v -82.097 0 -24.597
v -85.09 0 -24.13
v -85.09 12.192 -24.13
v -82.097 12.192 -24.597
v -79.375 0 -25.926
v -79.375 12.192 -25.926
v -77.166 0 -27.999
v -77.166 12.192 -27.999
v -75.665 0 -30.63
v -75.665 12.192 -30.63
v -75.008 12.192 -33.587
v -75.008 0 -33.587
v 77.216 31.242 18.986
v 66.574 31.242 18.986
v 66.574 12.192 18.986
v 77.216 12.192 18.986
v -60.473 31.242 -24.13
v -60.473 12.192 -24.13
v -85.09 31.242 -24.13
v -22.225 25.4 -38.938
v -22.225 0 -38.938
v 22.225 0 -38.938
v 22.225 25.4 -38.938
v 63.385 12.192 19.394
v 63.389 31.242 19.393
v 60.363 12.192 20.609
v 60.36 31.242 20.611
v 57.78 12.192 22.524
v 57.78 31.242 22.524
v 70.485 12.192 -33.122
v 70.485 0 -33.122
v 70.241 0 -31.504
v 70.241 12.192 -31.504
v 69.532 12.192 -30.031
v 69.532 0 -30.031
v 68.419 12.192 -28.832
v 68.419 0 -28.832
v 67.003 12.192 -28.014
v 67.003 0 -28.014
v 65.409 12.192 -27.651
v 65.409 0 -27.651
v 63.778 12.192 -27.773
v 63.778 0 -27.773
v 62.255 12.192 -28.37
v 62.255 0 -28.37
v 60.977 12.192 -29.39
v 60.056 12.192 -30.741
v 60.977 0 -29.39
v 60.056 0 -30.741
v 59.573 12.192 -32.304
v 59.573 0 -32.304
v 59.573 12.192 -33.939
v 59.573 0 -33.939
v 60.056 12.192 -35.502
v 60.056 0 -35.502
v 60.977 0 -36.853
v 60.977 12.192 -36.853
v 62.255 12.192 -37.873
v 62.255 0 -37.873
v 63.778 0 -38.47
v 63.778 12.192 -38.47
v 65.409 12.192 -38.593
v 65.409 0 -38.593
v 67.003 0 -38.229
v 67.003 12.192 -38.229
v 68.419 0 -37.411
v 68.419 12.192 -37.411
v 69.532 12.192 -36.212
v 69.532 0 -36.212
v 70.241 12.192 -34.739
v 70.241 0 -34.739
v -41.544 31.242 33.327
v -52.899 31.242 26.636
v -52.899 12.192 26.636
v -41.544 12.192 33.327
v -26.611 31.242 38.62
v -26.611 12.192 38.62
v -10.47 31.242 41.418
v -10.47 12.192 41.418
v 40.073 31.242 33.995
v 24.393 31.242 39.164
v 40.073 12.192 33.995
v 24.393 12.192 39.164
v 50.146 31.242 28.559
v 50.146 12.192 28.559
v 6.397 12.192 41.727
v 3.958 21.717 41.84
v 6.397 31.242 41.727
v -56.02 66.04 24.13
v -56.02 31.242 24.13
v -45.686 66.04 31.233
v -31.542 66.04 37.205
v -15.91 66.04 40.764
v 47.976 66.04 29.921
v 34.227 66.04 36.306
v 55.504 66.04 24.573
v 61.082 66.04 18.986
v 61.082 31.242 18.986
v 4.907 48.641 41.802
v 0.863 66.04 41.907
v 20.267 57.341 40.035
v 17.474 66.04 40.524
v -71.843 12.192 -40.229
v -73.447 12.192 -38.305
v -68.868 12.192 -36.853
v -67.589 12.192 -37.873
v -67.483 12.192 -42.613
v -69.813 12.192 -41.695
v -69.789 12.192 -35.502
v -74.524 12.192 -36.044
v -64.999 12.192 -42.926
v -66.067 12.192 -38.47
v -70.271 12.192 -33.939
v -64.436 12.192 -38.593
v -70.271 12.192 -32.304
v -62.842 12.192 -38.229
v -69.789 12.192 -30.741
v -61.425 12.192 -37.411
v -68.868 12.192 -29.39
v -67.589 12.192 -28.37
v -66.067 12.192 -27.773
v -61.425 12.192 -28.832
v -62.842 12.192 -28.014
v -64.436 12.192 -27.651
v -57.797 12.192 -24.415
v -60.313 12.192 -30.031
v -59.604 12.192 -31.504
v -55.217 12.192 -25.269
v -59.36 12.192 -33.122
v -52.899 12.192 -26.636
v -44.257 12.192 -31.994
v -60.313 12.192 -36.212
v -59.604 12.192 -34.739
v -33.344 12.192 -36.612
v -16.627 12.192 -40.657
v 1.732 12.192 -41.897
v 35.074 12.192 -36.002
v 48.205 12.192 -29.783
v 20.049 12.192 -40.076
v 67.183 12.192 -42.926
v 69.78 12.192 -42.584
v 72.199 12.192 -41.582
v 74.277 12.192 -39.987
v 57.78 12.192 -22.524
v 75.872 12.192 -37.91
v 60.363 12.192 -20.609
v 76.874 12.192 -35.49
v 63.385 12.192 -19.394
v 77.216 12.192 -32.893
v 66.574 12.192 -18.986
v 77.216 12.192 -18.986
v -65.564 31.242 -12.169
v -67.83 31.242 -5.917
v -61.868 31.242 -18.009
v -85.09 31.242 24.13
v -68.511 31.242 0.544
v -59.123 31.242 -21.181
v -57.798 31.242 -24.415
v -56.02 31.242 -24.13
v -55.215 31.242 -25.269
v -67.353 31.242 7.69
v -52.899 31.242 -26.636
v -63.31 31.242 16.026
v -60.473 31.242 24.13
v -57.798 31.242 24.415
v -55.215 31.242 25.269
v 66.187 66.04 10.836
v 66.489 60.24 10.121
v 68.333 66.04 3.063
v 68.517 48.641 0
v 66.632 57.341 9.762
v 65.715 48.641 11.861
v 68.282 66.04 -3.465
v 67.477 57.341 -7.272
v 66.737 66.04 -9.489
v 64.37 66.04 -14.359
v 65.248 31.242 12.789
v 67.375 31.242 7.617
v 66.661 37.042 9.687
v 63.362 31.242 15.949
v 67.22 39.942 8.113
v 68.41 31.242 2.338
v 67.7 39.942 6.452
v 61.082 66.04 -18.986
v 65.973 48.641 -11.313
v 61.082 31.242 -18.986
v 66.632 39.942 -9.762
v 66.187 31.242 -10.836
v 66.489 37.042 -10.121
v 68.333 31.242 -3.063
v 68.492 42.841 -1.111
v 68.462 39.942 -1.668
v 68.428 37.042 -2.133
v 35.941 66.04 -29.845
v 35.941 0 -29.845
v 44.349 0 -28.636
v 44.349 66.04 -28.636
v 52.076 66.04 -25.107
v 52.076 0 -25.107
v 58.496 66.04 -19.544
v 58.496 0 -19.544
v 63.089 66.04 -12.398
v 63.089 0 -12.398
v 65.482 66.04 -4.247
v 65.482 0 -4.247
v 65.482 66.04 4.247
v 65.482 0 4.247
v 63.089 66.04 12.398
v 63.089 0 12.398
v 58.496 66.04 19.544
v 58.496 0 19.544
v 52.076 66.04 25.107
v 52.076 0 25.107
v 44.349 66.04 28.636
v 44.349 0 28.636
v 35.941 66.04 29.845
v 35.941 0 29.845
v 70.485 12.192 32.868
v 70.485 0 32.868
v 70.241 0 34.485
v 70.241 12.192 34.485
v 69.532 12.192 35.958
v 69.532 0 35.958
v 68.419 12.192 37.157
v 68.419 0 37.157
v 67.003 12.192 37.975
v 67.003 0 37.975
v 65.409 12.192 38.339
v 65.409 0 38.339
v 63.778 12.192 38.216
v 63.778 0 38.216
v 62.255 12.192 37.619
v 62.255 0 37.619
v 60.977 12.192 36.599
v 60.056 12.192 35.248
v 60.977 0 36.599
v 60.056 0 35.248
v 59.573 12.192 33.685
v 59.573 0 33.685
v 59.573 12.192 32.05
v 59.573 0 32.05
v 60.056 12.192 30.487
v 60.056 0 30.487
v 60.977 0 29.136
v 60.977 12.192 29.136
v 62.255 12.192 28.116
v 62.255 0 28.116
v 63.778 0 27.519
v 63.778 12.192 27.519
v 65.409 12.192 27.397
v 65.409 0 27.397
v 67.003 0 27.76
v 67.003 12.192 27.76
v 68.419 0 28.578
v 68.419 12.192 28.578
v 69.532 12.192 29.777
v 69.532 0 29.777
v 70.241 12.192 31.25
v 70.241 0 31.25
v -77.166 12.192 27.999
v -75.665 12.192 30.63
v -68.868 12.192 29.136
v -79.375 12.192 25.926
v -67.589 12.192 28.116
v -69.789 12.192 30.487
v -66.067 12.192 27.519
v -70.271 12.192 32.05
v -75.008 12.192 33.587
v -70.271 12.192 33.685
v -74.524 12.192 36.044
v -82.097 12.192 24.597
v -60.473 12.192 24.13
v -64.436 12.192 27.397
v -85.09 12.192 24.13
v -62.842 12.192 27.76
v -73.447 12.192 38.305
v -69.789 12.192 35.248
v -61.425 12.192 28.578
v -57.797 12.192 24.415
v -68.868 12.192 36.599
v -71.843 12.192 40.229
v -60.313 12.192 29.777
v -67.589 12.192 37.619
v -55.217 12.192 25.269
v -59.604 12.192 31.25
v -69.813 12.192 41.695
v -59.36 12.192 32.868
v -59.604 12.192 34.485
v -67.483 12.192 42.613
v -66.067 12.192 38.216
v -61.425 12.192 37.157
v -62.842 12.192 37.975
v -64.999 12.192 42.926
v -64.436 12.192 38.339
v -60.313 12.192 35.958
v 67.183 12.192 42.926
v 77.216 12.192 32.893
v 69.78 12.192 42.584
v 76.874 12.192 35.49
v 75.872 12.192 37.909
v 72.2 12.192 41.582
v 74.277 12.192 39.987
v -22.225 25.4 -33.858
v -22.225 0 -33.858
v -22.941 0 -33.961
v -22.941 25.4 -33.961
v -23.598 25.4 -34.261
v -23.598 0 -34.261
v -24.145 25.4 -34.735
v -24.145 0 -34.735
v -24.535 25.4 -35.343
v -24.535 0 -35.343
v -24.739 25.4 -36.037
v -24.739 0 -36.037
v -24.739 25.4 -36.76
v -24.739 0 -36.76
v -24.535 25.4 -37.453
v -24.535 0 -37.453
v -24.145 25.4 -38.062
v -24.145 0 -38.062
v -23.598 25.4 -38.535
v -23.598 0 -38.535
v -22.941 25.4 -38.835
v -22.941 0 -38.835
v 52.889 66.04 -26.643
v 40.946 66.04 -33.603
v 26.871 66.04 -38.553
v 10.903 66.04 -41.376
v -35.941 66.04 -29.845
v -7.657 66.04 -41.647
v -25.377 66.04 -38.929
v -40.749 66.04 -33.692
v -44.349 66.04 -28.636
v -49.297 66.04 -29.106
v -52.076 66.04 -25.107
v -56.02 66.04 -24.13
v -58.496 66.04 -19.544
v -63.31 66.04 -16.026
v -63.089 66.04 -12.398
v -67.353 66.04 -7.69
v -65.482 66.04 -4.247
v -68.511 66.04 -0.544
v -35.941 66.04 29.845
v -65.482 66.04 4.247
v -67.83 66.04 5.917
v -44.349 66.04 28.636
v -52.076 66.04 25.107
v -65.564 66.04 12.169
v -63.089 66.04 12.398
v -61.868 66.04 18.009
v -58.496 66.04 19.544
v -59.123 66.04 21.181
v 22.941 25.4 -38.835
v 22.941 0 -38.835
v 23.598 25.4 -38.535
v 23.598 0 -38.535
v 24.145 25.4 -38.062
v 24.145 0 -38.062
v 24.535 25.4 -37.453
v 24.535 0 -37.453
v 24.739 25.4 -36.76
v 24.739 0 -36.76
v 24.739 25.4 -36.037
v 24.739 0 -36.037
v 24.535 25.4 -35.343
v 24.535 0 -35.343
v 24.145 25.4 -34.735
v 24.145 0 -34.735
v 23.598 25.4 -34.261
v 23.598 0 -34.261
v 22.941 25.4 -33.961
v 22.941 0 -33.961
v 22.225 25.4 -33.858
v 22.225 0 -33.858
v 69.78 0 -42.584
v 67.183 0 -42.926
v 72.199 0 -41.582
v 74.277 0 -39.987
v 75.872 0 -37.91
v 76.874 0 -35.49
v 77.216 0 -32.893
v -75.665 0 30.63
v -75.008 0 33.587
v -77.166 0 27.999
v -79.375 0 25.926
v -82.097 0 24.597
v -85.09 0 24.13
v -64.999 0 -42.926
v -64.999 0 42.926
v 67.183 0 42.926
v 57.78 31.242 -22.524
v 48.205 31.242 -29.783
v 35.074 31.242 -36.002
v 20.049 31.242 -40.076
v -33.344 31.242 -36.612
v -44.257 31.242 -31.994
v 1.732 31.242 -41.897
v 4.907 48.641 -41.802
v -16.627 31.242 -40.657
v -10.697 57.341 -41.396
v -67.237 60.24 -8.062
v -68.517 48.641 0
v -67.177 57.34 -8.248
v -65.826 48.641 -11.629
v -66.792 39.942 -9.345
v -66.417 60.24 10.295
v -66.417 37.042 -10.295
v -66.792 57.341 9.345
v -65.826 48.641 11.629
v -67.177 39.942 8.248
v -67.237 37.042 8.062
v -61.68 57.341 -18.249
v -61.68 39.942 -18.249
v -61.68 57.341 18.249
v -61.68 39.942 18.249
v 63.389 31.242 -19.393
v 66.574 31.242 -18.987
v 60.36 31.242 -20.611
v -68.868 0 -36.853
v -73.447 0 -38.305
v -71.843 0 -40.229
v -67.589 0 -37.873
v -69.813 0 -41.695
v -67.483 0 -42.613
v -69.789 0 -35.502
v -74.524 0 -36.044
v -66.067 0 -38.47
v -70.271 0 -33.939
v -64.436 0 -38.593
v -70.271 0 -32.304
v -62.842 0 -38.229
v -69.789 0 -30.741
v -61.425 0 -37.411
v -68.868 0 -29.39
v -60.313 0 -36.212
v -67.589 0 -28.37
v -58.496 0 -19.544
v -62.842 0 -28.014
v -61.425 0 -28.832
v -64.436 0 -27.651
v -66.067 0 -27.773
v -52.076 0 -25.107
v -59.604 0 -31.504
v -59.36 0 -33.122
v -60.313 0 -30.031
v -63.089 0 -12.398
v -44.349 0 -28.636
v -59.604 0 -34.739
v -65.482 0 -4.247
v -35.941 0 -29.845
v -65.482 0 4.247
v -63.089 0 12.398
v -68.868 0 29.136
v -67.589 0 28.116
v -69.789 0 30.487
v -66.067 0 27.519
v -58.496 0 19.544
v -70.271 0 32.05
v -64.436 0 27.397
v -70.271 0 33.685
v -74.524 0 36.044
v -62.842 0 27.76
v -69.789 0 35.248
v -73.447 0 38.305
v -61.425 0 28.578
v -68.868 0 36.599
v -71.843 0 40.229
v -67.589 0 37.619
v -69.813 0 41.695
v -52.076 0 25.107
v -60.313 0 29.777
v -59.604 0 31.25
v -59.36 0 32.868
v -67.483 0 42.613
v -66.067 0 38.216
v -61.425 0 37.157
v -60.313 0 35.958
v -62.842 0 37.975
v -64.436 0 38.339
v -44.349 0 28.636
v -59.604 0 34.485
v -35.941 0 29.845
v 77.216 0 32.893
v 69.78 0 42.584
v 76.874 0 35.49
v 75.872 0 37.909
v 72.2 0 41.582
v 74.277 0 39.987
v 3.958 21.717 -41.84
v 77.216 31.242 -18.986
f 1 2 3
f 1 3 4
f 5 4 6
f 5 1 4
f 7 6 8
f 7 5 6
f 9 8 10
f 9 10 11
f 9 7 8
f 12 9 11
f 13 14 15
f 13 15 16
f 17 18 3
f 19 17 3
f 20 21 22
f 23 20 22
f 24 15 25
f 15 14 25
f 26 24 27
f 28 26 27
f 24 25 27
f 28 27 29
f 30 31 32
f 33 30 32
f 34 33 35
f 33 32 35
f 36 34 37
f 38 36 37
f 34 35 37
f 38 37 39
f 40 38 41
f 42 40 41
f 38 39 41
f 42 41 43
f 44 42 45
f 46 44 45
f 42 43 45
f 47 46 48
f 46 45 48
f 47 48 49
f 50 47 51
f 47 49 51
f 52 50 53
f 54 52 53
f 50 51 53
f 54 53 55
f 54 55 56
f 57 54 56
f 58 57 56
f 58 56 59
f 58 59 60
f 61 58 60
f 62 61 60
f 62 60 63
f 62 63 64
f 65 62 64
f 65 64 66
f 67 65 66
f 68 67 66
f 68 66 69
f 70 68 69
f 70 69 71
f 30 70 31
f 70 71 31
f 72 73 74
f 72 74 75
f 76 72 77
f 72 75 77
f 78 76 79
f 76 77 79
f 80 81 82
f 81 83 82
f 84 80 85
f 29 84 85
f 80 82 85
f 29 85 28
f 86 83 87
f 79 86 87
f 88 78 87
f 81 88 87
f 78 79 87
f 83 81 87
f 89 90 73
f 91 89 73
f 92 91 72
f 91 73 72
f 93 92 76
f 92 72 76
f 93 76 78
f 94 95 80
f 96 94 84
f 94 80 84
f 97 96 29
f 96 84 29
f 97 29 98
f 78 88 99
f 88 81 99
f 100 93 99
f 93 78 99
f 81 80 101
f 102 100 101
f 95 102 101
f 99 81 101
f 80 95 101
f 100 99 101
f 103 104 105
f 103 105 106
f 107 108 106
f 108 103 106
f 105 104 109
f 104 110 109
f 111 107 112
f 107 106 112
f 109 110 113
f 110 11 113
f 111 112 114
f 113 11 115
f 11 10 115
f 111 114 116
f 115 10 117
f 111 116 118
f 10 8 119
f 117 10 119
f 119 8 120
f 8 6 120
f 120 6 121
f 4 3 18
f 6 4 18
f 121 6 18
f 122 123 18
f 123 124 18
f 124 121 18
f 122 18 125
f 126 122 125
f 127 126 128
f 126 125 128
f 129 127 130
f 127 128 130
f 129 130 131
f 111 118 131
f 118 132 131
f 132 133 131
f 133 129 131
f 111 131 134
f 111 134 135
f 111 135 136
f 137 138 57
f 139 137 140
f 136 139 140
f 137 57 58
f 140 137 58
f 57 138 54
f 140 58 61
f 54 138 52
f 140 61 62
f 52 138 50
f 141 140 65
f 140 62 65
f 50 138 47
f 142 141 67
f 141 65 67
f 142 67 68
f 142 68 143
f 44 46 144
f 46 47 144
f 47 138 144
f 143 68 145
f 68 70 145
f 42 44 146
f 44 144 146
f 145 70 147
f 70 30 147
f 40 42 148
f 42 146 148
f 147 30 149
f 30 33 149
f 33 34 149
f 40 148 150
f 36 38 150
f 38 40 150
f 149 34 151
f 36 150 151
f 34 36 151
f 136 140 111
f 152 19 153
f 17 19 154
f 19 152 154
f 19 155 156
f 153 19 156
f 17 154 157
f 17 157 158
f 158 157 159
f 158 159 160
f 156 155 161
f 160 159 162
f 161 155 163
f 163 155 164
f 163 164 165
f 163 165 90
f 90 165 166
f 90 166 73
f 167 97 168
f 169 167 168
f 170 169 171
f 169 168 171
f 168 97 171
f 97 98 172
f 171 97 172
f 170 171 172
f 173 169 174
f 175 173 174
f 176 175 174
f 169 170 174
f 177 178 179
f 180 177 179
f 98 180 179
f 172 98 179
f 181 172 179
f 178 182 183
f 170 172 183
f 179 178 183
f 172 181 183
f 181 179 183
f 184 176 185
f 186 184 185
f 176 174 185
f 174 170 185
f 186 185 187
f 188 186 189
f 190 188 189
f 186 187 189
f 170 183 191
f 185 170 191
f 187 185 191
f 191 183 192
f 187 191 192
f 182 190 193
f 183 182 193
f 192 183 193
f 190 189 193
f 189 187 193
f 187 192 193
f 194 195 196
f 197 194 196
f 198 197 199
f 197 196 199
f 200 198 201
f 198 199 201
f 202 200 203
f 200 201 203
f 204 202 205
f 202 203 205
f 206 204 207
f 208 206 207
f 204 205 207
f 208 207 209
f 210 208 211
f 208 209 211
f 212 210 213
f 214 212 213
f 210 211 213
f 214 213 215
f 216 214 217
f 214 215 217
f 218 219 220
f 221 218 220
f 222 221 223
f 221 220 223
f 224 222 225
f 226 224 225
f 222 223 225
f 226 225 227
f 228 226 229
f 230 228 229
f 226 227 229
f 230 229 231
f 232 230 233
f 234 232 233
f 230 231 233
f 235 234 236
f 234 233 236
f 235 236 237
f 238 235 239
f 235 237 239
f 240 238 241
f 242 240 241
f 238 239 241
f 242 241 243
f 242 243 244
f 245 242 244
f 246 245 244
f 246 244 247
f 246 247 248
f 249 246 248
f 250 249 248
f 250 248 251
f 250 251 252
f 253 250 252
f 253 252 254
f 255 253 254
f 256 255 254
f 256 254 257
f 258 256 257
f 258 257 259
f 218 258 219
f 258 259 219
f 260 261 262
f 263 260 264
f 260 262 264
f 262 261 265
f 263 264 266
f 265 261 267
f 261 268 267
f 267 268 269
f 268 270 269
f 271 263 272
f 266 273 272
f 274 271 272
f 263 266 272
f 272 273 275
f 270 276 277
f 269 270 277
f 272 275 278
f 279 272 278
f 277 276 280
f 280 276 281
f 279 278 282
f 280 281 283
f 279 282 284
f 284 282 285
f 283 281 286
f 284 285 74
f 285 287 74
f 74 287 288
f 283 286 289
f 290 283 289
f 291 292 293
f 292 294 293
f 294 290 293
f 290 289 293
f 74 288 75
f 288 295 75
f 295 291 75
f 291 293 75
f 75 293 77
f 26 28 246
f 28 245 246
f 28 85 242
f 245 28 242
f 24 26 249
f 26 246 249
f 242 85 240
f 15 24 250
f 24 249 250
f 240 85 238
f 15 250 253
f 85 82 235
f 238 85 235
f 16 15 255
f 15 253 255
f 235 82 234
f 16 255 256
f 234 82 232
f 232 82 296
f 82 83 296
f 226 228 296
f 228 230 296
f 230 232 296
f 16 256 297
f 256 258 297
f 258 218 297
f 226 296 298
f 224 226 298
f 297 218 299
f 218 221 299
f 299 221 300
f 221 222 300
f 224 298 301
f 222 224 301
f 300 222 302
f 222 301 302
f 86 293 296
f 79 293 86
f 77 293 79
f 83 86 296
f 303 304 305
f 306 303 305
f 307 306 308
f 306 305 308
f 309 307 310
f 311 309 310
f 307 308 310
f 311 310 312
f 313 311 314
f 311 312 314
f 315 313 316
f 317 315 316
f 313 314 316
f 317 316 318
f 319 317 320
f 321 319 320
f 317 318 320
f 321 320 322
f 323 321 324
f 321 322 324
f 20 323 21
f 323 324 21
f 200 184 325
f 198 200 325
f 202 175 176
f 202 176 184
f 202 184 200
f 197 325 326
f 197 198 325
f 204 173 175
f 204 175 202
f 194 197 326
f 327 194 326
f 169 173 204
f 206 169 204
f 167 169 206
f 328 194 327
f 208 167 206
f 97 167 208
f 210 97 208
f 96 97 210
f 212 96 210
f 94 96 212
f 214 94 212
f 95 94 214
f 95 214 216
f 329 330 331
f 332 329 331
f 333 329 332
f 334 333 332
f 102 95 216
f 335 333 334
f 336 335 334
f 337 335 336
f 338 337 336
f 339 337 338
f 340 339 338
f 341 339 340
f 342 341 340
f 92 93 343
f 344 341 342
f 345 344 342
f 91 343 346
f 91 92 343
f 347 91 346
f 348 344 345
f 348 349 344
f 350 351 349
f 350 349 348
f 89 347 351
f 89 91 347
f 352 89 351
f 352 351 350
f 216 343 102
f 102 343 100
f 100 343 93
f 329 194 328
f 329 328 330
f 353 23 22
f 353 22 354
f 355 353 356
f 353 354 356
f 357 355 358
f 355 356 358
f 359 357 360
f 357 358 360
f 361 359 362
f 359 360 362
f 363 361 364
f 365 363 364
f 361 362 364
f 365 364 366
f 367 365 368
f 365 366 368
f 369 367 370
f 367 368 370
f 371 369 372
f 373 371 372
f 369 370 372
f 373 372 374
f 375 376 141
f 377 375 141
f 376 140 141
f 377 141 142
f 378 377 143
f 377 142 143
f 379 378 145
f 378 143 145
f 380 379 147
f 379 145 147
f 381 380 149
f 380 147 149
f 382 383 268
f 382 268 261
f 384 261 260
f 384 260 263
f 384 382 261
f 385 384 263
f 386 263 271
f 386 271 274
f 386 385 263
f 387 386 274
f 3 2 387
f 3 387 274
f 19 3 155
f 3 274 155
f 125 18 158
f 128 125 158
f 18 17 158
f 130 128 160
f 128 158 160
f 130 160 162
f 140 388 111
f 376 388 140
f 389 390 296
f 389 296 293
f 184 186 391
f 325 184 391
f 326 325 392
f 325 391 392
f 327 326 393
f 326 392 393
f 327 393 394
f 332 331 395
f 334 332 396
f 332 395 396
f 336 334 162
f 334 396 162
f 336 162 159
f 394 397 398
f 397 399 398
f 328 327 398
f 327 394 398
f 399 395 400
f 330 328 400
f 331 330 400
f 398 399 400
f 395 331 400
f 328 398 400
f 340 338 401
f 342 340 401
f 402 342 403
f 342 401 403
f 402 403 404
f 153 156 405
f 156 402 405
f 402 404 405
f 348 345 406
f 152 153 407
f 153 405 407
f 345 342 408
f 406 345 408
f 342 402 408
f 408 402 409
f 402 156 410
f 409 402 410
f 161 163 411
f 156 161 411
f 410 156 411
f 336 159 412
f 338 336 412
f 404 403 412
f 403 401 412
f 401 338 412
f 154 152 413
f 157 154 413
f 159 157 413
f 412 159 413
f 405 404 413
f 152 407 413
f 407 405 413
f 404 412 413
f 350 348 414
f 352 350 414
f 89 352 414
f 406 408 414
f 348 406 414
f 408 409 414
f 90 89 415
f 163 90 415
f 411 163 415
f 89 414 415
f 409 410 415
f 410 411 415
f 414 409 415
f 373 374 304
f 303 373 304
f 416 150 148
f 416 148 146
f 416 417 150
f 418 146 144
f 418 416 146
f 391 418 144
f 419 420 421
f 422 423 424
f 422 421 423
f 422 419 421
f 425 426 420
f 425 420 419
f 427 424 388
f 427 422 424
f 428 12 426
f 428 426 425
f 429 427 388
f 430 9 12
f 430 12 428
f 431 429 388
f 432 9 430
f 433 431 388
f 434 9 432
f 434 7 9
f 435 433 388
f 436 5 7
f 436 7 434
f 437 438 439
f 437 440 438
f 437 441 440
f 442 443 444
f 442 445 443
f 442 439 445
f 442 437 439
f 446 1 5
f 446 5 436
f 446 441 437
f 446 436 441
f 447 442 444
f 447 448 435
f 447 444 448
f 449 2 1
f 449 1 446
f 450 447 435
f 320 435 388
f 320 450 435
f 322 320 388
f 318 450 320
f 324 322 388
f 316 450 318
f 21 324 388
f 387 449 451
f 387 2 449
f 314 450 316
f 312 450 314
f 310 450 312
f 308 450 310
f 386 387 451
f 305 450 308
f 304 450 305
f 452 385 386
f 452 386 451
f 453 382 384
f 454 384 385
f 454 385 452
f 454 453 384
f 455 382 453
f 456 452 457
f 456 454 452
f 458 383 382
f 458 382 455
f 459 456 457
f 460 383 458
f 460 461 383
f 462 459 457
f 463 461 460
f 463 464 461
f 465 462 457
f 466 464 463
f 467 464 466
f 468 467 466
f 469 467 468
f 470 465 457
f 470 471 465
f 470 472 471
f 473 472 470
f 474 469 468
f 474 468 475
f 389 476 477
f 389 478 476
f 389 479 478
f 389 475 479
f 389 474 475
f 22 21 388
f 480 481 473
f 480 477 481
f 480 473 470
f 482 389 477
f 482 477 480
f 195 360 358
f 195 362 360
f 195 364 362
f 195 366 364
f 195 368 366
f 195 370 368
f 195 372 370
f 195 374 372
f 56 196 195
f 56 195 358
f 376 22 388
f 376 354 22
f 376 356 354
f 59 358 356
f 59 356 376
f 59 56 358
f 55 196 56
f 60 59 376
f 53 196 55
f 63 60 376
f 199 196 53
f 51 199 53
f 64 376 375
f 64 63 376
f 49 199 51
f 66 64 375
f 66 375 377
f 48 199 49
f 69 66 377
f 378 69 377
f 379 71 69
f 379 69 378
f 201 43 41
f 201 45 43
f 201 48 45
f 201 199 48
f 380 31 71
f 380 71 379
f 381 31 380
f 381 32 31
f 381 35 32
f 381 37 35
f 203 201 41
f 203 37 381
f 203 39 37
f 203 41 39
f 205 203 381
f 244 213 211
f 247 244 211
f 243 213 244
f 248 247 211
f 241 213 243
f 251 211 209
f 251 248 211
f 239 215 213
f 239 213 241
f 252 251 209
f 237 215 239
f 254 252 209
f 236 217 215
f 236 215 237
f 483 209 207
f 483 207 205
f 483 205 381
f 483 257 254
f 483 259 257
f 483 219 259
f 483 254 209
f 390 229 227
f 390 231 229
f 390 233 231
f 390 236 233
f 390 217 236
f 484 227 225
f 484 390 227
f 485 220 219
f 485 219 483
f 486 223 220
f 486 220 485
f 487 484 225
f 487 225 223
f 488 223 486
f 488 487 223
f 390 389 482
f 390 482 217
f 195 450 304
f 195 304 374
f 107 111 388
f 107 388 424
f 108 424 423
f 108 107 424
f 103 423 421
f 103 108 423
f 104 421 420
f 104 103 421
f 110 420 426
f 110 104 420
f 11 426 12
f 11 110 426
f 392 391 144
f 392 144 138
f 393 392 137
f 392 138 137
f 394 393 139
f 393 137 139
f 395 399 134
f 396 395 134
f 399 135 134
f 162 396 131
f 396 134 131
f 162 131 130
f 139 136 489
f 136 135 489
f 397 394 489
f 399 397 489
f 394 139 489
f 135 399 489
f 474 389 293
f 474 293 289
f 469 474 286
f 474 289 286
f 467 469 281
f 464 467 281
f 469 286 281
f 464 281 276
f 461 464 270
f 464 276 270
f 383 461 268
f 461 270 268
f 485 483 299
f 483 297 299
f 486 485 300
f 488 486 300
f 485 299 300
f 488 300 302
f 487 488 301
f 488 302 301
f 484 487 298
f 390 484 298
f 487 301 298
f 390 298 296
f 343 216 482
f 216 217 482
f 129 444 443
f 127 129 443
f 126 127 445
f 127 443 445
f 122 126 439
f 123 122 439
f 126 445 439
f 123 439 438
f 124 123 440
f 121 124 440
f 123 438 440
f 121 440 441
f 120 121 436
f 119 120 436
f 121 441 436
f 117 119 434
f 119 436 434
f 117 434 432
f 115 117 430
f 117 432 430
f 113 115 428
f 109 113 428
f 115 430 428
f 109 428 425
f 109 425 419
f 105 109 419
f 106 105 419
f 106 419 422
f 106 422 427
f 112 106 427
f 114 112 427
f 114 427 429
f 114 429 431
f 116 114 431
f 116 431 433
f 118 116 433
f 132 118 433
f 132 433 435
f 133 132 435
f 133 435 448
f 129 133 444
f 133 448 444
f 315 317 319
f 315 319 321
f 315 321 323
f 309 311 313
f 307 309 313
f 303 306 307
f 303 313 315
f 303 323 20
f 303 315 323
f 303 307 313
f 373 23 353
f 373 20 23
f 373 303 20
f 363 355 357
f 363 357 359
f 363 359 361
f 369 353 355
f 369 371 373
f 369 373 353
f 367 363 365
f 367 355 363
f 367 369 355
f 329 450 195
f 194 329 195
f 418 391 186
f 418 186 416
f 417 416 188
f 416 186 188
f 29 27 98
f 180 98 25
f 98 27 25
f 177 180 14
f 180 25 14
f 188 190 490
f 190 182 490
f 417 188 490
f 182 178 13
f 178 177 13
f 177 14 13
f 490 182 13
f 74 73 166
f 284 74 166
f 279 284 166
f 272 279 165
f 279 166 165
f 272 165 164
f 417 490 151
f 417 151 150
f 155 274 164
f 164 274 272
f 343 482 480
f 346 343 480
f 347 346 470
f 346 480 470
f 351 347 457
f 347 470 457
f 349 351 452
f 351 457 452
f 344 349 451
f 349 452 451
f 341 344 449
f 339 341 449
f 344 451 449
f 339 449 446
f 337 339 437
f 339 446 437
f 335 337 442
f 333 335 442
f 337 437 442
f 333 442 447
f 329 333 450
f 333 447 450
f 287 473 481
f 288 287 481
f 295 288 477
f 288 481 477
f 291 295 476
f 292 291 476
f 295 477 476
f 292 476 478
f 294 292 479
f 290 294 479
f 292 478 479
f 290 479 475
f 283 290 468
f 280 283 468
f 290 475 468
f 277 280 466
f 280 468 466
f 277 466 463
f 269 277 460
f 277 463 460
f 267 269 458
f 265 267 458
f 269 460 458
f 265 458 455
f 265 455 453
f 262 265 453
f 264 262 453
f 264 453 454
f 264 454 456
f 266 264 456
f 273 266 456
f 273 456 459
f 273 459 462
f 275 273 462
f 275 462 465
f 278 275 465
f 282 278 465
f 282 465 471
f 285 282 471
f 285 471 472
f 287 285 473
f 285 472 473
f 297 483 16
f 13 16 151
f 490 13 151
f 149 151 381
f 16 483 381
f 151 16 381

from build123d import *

# Parameters (mm, degrees)
F0_R        = 5.4864
F1_DEPTH    = 12.192
F3_DEPTH    = 19.05
F5_DEPTH    = 34.798
F6_R        = 10.033
F7_T4_DEPTH = 12.192
F7_T9_DEPTH = 12.192
F8_R        = 12.7
F10_DEPTH   = 25.4


# Not quite as in the source:
# - a fillet or chamfer that OpenCascade refuses, or shapes differently, is made with other operations: its cross-section is extruded or revolved along the edge and cut away or added


with BuildPart() as f1:
    # F0 (on Front) → F1 (new body)
    with BuildSketch(Plane.XZ):
        Polygon((-75.0316, 24.13), (-85.09, 24.13), (-85.09, -24.13), (-75.0316, -24.13), (-75.0316, -42.926), (77.216, -42.926), (77.216, 42.926), (-75.0316, 42.926), align=None)
        with Locations((-64.8462, -33.1216)):
            Circle(F0_R, mode=Mode.SUBTRACT)
        with Locations((64.9986, -33.1216)):
            Circle(F0_R, mode=Mode.SUBTRACT)
        with Locations((-64.8462, 32.8676)):
            Circle(F0_R, mode=Mode.SUBTRACT)
        with BuildLine():
            Line((35.941, -29.845), (-35.941, -29.845))
            ThreePointArc((-35.941, -29.845), (-65.786, 0), (-35.941, 29.845))
            Line((-35.941, 29.845), (35.941, 29.845))
            ThreePointArc((35.941, 29.845), (65.786, 0), (35.941, -29.845))
        make_face(mode=Mode.SUBTRACT)
        with Locations((64.9986, 32.8676)):
            Circle(F0_R, mode=Mode.SUBTRACT)
    extrude(amount=-F1_DEPTH)

    # F2 (on face) → F3 (join)
    with BuildSketch(Plane(origin=(0, 12.192, 0), x_dir=(-1, 0, 0), z_dir=(0, 1, 0))):
        with BuildLine():
            add(Edge.make_bspline(
                [(-61.0821252186, 18.9865), (-68.5165, 10.0378265977), (-68.5165, 0)],
                knots=[5.8130237676, 5.8130237676, 5.8130237676, 6.2831853072, 6.2831853072, 6.2831853072], degree=2, weights=[1, 0.9724955315, 1]))
            add(Edge.make_bspline(
                [(-68.5165, 0), (-68.5165, -10.0378265977), (-61.0821252186, -18.9865)],
                knots=[0, 0, 0, 0.4701615396, 0.4701615396, 0.4701615396], degree=2, weights=[1, 0.9724955315, 1]))
            add(Edge.make_bspline(
                [(-61.0821252186, -18.9865), (-9.5155823774, -81.056568289), (56.0204921364, -24.13)],
                knots=[0.4701615396, 0.4701615396, 0.4701615396, 2.5280622458, 2.5280622458, 2.5280622458], degree=2, weights=[1, 0.5157184224, 1]))
            add(Edge.make_bspline(
                [(56.0204921364, -24.13), (83.7998845283, 0), (56.0204921364, 24.13)],
                knots=[2.5280622458, 2.5280622458, 2.5280622458, 3.7551230613, 3.7551230613, 3.7551230613], degree=2, weights=[1, 0.8176204584, 1]))
            add(Edge.make_bspline(
                [(56.0204921364, 24.13), (-9.5155823774, 81.056568289), (-61.0821252186, 18.9865)],
                knots=[3.7551230613, 3.7551230613, 3.7551230613, 5.8130237676, 5.8130237676, 5.8130237676], degree=2, weights=[1, 0.5157184224, 1]))
        make_face()
        with BuildLine():
            ThreePointArc((35.941, 29.845), (65.786, 0), (35.941, -29.845))
            Line((35.941, -29.845), (-35.941, -29.845))
            ThreePointArc((-35.941, -29.845), (-65.786, 0), (-35.941, 29.845))
            Line((-35.941, 29.845), (35.941, 29.845))
        make_face(mode=Mode.SUBTRACT)
        with BuildLine():
            add(Edge.make_bspline(
                [(-68.5165, 0), (-68.5165, -10.0378265977), (-61.0821252186, -18.9865)],
                knots=[0, 0, 0, 0.4701615396, 0.4701615396, 0.4701615396], degree=2, weights=[1, 0.9724955315, 1]))
            add(Edge.make_bspline(
                [(-61.0821252186, 18.9865), (-68.5165, 10.0378265977), (-68.5165, 0)],
                knots=[5.8130237676, 5.8130237676, 5.8130237676, 6.2831853072, 6.2831853072, 6.2831853072], degree=2, weights=[1, 0.9724955315, 1]))
            Line((-61.0821252186, 18.9865), (-77.216, 18.9865))
            Line((-77.216, 18.9865), (-77.216, -18.9865))
            Line((-77.216, -18.9865), (-61.0821252186, -18.9865))
        make_face()
        with BuildLine():
            add(Edge.make_bspline(
                [(56.0204921364, -24.13), (83.7998845283, 0), (56.0204921364, 24.13)],
                knots=[2.5280622458, 2.5280622458, 2.5280622458, 3.7551230613, 3.7551230613, 3.7551230613], degree=2, weights=[1, 0.8176204584, 1]))
            Line((56.0204921364, -24.13), (85.09, -24.13))
            Line((85.09, -24.13), (85.09, 24.13))
            Line((85.09, 24.13), (56.0204921364, 24.13))
        make_face()
    extrude(amount=F3_DEPTH)

    # F4 (on face) → F5 (join)
    with BuildSketch(Plane(origin=(0, 31.242, 0), x_dir=(-1, 0, 0), z_dir=(0, 1, 0))):
        with BuildLine():
            add(Edge.make_bspline(
                [(-61.0821252186, 18.9865), (-68.5165, 10.0378265977), (-68.5165, 0)],
                knots=[5.8130237676, 5.8130237676, 5.8130237676, 6.2831853072, 6.2831853072, 6.2831853072], degree=2, weights=[1, 0.9724955315, 1]))
            add(Edge.make_bspline(
                [(-68.5165, 0), (-68.5165, -10.0378265977), (-61.0821252186, -18.9865)],
                knots=[0, 0, 0, 0.4701615396, 0.4701615396, 0.4701615396], degree=2, weights=[1, 0.9724955315, 1]))
            add(Edge.make_bspline(
                [(-61.0821252186, -18.9865), (-9.5155823774, -81.056568289), (56.0204921364, -24.13)],
                knots=[0.4701615396, 0.4701615396, 0.4701615396, 2.5280622458, 2.5280622458, 2.5280622458], degree=2, weights=[1, 0.5157184224, 1]))
            add(Edge.make_bspline(
                [(56.0204921364, -24.13), (83.7998845283, 0), (56.0204921364, 24.13)],
                knots=[2.5280622458, 2.5280622458, 2.5280622458, 3.7551230613, 3.7551230613, 3.7551230613], degree=2, weights=[1, 0.8176204584, 1]))
            add(Edge.make_bspline(
                [(56.0204921364, 24.13), (-9.5155823774, 81.056568289), (-61.0821252186, 18.9865)],
                knots=[3.7551230613, 3.7551230613, 3.7551230613, 5.8130237676, 5.8130237676, 5.8130237676], degree=2, weights=[1, 0.5157184224, 1]))
        make_face()
        with BuildLine():
            Line((-35.941, 29.845), (35.941, 29.845))
            ThreePointArc((35.941, 29.845), (65.786, 0), (35.941, -29.845))
            Line((35.941, -29.845), (-35.941, -29.845))
            ThreePointArc((-35.941, -29.845), (-65.786, 0), (-35.941, 29.845))
        make_face(mode=Mode.SUBTRACT)
    extrude(amount=F5_DEPTH)

    # F6
    f6_edges = [f1.edges().sort_by_distance(p)[0] for p in [
        (-75.0316, 6.096, 42.926),
        (77.216, 6.096, 42.926),
        (77.216, 6.096, -42.926),
        (-75.0316, 6.096, -42.926),
    ]]
    fillet(f6_edges, radius=F6_R)

    # F7: fillet of radius 10.16 on 2 edges, made by hand


with BuildPart() as f7_tool2:
    # F7_s3 → F7_t4 (new body)
    with BuildSketch(Plane.XZ):
        with BuildLine():
            ThreePointArc((-85.1432181398, -24.13), (-78.2119770428, -26.8614404589), (-75.0075612141, -33.5871069182))
            Line((-75.0075612141, -33.5871069182), (-73.9939955216, -33.5168176101))
            ThreePointArc((-73.9939955216, -33.5168176101), (-74.0156, -32.893), (-74.0156, -24.13))
            Line((-74.0156, -24.13), (-75.0316, -23.114))
            Line((-75.0316, -23.114), (-85.1432181398, -23.114))
            Line((-85.1432181398, -23.114), (-85.1432181398, -24.13))
        make_face()
    extrude(amount=-F7_T4_DEPTH)

    split(bisect_by=Plane.YZ.offset(-85.09), keep=Keep.TOP)


with BuildPart() as f1_1:
    add(f1.part)

    # F7_t1: union F7_tool2
    add(f7_tool2.part)


with BuildPart() as f7_tool7:
    # F7_s8 → F7_t9 (new body)
    with BuildSketch(Plane.XZ):
        with BuildLine():
            ThreePointArc((-75.0075612141, 33.5871069182), (-78.2119770428, 26.8614404589), (-85.1432181398, 24.13))
            Line((-85.1432181398, 24.13), (-85.1432181398, 23.114))
            Line((-85.1432181398, 23.114), (-75.0316, 23.114))
            Line((-75.0316, 23.114), (-74.0156, 24.13))
            ThreePointArc((-74.0156, 24.13), (-74.0156, 32.893), (-73.9939955216, 33.5168176101))
            Line((-73.9939955216, 33.5168176101), (-75.0075612141, 33.5871069182))
        make_face()
    extrude(amount=-F7_T9_DEPTH)

    split(bisect_by=Plane.YZ.offset(-85.09), keep=Keep.TOP)


with BuildPart() as f1_2:
    add(f1_1.part)

    # F7_t6: union F7_tool7
    add(f7_tool7.part)

    # F8 (call 1 of 4: OpenCascade refuses the feature's edges together)
    f8_edges = [f1_2.edges().sort_by_distance(p)[0] for p in [
        (-56.020492, 21.717, 24.13),
    ]]
    fillet(f8_edges, radius=F8_R)

    # F8#3 (call 2 of 4)
    f8_3_edges = [f1_2.edges().sort_by_distance(p)[0] for p in [
        (61.082125, 21.717, -18.9865),
    ]]
    fillet(f8_3_edges, radius=F8_R)

    # F8#4 (call 3 of 4)
    f8_4_edges = [f1_2.edges().sort_by_distance(p)[0] for p in [
        (-56.020492, 21.717, -24.13),
    ]]
    fillet(f8_4_edges, radius=F8_R)

    # F8#2 (call 4 of 4)
    f8_2_edges = [f1_2.edges().sort_by_distance(p)[0] for p in [
        (61.082125, 21.717, 18.9865),
    ]]
    fillet(f8_2_edges, radius=F8_R)

    # F9 (on face) → F10 (cut)
    with BuildSketch(Plane.XZ):
        with BuildLine():
            ThreePointArc((22.225, -38.9382), (24.765, -36.3982), (22.225, -33.8582))
            Line((22.225, -33.8582), (-22.225, -33.8582))
            ThreePointArc((-22.225, -33.8582), (-24.765, -36.3982), (-22.225, -38.9382))
            Line((-22.225, -38.9382), (22.225, -38.9382))
        make_face()
    extrude(amount=-F10_DEPTH, mode=Mode.SUBTRACT)


solid = f1_2.part
